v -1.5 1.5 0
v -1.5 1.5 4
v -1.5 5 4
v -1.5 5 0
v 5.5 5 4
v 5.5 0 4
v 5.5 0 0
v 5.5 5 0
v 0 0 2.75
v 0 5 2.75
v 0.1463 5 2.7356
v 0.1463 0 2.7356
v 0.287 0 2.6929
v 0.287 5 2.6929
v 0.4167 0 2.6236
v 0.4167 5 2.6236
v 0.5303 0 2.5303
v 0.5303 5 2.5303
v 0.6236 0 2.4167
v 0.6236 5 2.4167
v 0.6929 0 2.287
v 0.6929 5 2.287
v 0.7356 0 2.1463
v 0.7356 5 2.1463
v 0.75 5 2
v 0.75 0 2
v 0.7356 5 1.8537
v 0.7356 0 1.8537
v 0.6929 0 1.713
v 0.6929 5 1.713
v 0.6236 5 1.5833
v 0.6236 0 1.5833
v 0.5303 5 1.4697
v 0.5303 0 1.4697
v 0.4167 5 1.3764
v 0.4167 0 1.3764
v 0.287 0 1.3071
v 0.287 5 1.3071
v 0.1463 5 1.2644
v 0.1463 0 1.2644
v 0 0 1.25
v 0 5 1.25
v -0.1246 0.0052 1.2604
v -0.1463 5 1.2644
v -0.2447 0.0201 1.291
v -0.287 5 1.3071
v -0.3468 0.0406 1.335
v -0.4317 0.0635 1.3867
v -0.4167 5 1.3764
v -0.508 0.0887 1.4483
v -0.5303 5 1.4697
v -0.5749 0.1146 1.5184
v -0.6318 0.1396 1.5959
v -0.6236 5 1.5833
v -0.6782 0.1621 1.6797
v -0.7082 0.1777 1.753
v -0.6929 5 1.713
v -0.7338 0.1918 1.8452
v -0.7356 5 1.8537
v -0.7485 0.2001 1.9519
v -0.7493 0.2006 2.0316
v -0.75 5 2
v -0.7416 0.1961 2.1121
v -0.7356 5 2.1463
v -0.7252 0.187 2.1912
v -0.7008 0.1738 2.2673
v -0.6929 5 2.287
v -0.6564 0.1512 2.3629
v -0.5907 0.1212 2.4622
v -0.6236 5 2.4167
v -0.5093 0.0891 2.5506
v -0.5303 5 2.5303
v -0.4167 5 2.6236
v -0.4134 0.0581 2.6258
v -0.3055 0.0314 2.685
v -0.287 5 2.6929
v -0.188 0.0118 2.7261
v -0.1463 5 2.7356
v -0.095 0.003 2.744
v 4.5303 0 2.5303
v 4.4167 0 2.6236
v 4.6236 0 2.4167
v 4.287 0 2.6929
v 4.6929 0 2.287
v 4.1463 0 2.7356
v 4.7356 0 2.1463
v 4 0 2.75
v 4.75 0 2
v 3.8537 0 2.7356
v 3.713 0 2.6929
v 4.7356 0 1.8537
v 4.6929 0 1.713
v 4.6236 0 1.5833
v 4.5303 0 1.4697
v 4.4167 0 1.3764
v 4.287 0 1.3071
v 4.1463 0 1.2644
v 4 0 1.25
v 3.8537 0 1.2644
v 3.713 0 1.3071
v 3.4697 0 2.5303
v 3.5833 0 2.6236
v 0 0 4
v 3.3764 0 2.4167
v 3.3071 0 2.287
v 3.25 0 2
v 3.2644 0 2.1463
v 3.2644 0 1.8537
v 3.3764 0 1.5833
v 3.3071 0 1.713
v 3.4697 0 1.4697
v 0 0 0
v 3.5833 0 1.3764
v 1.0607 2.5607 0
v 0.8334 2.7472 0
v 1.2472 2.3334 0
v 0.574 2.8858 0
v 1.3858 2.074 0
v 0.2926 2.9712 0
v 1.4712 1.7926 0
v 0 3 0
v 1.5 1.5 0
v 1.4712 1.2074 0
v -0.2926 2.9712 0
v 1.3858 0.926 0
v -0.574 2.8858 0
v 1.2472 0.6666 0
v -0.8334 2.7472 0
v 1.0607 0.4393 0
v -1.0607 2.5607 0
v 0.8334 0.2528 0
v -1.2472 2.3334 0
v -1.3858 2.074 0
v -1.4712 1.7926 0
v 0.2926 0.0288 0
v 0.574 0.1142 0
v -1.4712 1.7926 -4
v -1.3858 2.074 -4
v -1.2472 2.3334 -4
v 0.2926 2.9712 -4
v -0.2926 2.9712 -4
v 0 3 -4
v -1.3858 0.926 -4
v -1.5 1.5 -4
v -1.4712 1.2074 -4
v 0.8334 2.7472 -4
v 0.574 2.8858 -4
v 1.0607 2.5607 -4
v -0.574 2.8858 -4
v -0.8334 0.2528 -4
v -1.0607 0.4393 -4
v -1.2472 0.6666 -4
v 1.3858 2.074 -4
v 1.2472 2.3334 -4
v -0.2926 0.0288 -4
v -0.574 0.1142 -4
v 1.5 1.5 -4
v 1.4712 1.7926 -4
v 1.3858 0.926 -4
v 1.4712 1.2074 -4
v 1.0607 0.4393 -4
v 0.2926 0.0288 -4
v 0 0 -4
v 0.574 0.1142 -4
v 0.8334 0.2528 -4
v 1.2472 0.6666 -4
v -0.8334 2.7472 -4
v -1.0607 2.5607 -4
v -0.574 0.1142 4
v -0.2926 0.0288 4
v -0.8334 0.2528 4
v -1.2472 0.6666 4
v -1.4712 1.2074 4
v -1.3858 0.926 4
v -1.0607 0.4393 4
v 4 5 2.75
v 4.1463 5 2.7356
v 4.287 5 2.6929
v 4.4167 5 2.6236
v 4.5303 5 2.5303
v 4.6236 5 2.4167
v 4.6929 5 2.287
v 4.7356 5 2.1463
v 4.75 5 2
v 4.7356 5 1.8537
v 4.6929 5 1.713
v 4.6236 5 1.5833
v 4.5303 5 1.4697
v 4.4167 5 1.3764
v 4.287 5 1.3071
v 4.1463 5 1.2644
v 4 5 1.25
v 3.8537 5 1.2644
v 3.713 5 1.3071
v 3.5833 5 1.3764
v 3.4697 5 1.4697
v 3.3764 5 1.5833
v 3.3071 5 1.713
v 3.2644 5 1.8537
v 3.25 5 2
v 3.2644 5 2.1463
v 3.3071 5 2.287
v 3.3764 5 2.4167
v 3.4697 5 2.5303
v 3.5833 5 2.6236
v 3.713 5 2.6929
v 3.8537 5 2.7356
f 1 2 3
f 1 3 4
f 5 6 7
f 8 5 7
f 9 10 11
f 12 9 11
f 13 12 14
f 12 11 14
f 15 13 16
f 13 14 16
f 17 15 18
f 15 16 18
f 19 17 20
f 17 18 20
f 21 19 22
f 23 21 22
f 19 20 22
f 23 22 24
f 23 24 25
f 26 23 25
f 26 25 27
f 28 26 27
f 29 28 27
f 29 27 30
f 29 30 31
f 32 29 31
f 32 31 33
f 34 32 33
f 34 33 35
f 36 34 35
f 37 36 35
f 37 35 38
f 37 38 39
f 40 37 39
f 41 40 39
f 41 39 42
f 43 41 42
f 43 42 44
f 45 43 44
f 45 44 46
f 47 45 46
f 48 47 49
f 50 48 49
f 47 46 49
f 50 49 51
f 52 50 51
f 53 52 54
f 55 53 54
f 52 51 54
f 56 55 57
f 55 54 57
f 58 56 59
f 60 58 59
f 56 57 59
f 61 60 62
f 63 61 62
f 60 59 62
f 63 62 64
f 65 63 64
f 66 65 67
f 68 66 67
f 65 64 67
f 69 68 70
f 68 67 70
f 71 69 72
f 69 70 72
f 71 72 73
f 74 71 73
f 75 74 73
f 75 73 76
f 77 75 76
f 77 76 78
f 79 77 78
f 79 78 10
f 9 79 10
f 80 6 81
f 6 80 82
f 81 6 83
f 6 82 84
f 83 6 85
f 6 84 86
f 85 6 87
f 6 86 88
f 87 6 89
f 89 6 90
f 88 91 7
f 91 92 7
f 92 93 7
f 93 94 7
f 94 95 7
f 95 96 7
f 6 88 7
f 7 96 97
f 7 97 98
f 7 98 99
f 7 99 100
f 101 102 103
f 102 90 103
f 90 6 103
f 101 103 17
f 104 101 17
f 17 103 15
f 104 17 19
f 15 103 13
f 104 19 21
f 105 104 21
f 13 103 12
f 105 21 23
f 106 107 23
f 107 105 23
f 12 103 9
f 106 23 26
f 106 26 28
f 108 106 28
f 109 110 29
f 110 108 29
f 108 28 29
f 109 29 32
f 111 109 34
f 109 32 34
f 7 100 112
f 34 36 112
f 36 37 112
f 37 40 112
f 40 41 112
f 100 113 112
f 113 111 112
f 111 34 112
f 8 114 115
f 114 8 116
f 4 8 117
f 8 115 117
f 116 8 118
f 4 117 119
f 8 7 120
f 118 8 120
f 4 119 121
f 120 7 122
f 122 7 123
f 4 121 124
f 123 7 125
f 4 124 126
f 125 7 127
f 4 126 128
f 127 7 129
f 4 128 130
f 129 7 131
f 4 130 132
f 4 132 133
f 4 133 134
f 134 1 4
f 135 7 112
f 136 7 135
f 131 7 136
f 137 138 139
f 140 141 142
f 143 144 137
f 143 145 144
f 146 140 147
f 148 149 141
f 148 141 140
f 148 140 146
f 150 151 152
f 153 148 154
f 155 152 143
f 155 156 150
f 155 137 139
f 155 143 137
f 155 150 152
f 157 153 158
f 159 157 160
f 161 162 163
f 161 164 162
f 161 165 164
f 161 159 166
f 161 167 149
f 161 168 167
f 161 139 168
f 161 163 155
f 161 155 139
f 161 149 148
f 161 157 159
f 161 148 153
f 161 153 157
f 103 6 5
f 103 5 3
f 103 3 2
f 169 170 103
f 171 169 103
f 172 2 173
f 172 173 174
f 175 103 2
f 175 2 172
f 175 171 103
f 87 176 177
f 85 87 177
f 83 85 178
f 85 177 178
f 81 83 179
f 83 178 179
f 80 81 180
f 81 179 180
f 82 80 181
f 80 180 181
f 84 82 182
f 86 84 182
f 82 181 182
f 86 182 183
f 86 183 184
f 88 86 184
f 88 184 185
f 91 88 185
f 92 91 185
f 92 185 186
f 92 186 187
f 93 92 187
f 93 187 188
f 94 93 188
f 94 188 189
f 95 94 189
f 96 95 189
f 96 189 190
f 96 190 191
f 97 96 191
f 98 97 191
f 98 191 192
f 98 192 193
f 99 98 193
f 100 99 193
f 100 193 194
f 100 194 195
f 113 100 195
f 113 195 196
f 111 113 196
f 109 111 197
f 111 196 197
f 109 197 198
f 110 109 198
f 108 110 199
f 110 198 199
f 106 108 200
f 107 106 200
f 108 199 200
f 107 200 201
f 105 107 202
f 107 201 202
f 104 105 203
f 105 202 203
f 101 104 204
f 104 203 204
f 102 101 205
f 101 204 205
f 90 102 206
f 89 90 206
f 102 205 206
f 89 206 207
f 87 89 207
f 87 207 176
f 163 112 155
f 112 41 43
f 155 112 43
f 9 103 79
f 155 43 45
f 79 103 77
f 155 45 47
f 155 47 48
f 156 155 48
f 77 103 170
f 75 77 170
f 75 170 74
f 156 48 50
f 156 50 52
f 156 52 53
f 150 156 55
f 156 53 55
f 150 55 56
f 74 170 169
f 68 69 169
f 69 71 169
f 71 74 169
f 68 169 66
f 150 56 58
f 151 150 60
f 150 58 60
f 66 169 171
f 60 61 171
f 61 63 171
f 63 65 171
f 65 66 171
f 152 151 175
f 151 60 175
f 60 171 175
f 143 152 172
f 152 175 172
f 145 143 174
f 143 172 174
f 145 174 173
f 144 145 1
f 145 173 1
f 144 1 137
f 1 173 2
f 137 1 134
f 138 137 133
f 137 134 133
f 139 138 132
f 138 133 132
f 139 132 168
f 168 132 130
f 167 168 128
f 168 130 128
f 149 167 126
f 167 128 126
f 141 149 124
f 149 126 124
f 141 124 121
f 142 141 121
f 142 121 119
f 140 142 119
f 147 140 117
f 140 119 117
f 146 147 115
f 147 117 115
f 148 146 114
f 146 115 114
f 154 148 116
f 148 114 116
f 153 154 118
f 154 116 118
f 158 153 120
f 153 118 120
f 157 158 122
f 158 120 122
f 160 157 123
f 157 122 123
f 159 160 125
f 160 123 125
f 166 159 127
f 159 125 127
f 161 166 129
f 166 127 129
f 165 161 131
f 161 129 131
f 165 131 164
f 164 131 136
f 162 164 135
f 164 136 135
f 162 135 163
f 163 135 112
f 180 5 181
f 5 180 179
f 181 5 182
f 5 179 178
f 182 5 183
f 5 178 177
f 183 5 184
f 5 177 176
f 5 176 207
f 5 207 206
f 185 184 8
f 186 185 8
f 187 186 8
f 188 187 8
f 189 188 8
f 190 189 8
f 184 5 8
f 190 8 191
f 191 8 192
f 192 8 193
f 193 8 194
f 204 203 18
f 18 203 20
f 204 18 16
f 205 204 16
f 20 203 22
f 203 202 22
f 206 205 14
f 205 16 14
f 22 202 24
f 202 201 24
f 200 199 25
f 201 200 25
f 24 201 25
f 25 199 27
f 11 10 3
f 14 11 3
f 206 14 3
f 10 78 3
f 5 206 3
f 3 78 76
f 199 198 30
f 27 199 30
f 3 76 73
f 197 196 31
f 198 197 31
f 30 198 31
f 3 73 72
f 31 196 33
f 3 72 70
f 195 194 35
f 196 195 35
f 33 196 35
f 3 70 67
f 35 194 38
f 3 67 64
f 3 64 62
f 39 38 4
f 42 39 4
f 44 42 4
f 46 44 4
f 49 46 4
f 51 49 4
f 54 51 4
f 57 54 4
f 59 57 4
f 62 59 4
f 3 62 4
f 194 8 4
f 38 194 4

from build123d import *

# Parameters (mm, degrees)
SKETCH1_W           = 3
SKETCH1_H           = 8
BOSS_EXTRUDE1_DEPTH = 3
SKETCH2_W           = 4
SKETCH2_H           = 3
BOSS_EXTRUDE2_DEPTH = 4
SKETCH4_W           = 7
SKETCH4_H           = 4
BOSS_EXTRUDE3_DEPTH = 2
CUT_EXTRUDE2_REACH  = 10.441
SKETCH5_R           = 0.75
FILLET4_R           = 1.5


with BuildPart() as part:
    # Sketch1 → Boss-Extrude1 (new body)
    with BuildSketch(Plane(origin=(0, 0, 0), x_dir=(1, 0, 0), z_dir=(0, 1, 0))):
        Rectangle(SKETCH1_W, SKETCH1_H)
    extrude(amount=BOSS_EXTRUDE1_DEPTH)

    # Sketch2 → Boss-Extrude2 (add)
    with BuildSketch(Plane(origin=(1.5, 0, 0), x_dir=(0, 0, -1), z_dir=(1, 0, 0))):
        with Locations((-2, 1.5)):
            Rectangle(SKETCH2_W, SKETCH2_H)
    extrude(amount=BOSS_EXTRUDE2_DEPTH)

    # Sketch4 → Boss-Extrude3 (add)
    with BuildSketch(Plane(origin=(0, 3, 0), x_dir=(-1, 0, 0), z_dir=(0, -1, 0))):
        with Locations((-2, -2)):
            Rectangle(SKETCH4_W, SKETCH4_H)
    extrude(amount=-BOSS_EXTRUDE3_DEPTH)

    # Sketch5 → Cut-Extrude2 (cut, up to next)
    with BuildSketch(Plane(origin=(0, 5, 0), x_dir=(1, 0, 0), z_dir=(0, 1, 0)), mode=Mode.PRIVATE) as cut_extrude2_sk1:
        with Locations(Location((0, -2, 0), (0, 0, 270))):
            Circle(SKETCH5_R)
    cut_extrude2_tool1 = extrude(cut_extrude2_sk1.sketch, amount=-CUT_EXTRUDE2_REACH, mode=Mode.PRIVATE) & part.part
    # Sketch5 → Cut-Extrude2 (cut, up to next)
    with BuildSketch(Plane(origin=(0, 5, 0), x_dir=(1, 0, 0), z_dir=(0, 1, 0)), mode=Mode.PRIVATE) as cut_extrude2_sk2:
        with Locations(Location((4, -2, 0), (0, 0, 270))):
            Circle(SKETCH5_R)
    cut_extrude2_tool2 = extrude(cut_extrude2_sk2.sketch, amount=-CUT_EXTRUDE2_REACH, mode=Mode.PRIVATE) & part.part
    add(cut_extrude2_tool1.solids().sort_by_distance((0, 5, 2))[0], mode=Mode.SUBTRACT)
    add(cut_extrude2_tool2.solids().sort_by_distance((4, 5, 2))[0], mode=Mode.SUBTRACT)

    # Fillet4
    # the kernel refuses this fillet: 1.5 mm, written as the material it takes off along each edge
    with BuildSketch(Plane(origin=(1.5, 0, -7.75), x_dir=(-1, 0, 0), z_dir=(0, 0, 1)), Plane(origin=(1.5, 3, -7.75), x_dir=(0, -1, 0), z_dir=(0, 0, 1)), Plane(origin=(-1.5, 3, 0), x_dir=(0, -1, 0), z_dir=(0, 0, -1))) as fillet4_piece_1:
        with BuildLine():
            CenterArc((FILLET4_R, -FILLET4_R), FILLET4_R, 90, 90)
            Line((0, -FILLET4_R), (0, 0))
            Line((0, 0), (FILLET4_R, 0))
        make_face()
    extrude(amount=7.75, mode=Mode.SUBTRACT)
    with BuildSketch(Plane(origin=(-1.5, 0, 7.75), x_dir=(1, 0, 0), z_dir=(0, 0, -1))) as fillet4_piece_2:
        with BuildLine():
            CenterArc((FILLET4_R, -FILLET4_R), FILLET4_R, 90, 90)
            Line((0, -FILLET4_R), (0, 0))
            Line((0, 0), (FILLET4_R, 0))
        make_face()
    extrude(amount=15.5, mode=Mode.SUBTRACT)


solid = part.part
